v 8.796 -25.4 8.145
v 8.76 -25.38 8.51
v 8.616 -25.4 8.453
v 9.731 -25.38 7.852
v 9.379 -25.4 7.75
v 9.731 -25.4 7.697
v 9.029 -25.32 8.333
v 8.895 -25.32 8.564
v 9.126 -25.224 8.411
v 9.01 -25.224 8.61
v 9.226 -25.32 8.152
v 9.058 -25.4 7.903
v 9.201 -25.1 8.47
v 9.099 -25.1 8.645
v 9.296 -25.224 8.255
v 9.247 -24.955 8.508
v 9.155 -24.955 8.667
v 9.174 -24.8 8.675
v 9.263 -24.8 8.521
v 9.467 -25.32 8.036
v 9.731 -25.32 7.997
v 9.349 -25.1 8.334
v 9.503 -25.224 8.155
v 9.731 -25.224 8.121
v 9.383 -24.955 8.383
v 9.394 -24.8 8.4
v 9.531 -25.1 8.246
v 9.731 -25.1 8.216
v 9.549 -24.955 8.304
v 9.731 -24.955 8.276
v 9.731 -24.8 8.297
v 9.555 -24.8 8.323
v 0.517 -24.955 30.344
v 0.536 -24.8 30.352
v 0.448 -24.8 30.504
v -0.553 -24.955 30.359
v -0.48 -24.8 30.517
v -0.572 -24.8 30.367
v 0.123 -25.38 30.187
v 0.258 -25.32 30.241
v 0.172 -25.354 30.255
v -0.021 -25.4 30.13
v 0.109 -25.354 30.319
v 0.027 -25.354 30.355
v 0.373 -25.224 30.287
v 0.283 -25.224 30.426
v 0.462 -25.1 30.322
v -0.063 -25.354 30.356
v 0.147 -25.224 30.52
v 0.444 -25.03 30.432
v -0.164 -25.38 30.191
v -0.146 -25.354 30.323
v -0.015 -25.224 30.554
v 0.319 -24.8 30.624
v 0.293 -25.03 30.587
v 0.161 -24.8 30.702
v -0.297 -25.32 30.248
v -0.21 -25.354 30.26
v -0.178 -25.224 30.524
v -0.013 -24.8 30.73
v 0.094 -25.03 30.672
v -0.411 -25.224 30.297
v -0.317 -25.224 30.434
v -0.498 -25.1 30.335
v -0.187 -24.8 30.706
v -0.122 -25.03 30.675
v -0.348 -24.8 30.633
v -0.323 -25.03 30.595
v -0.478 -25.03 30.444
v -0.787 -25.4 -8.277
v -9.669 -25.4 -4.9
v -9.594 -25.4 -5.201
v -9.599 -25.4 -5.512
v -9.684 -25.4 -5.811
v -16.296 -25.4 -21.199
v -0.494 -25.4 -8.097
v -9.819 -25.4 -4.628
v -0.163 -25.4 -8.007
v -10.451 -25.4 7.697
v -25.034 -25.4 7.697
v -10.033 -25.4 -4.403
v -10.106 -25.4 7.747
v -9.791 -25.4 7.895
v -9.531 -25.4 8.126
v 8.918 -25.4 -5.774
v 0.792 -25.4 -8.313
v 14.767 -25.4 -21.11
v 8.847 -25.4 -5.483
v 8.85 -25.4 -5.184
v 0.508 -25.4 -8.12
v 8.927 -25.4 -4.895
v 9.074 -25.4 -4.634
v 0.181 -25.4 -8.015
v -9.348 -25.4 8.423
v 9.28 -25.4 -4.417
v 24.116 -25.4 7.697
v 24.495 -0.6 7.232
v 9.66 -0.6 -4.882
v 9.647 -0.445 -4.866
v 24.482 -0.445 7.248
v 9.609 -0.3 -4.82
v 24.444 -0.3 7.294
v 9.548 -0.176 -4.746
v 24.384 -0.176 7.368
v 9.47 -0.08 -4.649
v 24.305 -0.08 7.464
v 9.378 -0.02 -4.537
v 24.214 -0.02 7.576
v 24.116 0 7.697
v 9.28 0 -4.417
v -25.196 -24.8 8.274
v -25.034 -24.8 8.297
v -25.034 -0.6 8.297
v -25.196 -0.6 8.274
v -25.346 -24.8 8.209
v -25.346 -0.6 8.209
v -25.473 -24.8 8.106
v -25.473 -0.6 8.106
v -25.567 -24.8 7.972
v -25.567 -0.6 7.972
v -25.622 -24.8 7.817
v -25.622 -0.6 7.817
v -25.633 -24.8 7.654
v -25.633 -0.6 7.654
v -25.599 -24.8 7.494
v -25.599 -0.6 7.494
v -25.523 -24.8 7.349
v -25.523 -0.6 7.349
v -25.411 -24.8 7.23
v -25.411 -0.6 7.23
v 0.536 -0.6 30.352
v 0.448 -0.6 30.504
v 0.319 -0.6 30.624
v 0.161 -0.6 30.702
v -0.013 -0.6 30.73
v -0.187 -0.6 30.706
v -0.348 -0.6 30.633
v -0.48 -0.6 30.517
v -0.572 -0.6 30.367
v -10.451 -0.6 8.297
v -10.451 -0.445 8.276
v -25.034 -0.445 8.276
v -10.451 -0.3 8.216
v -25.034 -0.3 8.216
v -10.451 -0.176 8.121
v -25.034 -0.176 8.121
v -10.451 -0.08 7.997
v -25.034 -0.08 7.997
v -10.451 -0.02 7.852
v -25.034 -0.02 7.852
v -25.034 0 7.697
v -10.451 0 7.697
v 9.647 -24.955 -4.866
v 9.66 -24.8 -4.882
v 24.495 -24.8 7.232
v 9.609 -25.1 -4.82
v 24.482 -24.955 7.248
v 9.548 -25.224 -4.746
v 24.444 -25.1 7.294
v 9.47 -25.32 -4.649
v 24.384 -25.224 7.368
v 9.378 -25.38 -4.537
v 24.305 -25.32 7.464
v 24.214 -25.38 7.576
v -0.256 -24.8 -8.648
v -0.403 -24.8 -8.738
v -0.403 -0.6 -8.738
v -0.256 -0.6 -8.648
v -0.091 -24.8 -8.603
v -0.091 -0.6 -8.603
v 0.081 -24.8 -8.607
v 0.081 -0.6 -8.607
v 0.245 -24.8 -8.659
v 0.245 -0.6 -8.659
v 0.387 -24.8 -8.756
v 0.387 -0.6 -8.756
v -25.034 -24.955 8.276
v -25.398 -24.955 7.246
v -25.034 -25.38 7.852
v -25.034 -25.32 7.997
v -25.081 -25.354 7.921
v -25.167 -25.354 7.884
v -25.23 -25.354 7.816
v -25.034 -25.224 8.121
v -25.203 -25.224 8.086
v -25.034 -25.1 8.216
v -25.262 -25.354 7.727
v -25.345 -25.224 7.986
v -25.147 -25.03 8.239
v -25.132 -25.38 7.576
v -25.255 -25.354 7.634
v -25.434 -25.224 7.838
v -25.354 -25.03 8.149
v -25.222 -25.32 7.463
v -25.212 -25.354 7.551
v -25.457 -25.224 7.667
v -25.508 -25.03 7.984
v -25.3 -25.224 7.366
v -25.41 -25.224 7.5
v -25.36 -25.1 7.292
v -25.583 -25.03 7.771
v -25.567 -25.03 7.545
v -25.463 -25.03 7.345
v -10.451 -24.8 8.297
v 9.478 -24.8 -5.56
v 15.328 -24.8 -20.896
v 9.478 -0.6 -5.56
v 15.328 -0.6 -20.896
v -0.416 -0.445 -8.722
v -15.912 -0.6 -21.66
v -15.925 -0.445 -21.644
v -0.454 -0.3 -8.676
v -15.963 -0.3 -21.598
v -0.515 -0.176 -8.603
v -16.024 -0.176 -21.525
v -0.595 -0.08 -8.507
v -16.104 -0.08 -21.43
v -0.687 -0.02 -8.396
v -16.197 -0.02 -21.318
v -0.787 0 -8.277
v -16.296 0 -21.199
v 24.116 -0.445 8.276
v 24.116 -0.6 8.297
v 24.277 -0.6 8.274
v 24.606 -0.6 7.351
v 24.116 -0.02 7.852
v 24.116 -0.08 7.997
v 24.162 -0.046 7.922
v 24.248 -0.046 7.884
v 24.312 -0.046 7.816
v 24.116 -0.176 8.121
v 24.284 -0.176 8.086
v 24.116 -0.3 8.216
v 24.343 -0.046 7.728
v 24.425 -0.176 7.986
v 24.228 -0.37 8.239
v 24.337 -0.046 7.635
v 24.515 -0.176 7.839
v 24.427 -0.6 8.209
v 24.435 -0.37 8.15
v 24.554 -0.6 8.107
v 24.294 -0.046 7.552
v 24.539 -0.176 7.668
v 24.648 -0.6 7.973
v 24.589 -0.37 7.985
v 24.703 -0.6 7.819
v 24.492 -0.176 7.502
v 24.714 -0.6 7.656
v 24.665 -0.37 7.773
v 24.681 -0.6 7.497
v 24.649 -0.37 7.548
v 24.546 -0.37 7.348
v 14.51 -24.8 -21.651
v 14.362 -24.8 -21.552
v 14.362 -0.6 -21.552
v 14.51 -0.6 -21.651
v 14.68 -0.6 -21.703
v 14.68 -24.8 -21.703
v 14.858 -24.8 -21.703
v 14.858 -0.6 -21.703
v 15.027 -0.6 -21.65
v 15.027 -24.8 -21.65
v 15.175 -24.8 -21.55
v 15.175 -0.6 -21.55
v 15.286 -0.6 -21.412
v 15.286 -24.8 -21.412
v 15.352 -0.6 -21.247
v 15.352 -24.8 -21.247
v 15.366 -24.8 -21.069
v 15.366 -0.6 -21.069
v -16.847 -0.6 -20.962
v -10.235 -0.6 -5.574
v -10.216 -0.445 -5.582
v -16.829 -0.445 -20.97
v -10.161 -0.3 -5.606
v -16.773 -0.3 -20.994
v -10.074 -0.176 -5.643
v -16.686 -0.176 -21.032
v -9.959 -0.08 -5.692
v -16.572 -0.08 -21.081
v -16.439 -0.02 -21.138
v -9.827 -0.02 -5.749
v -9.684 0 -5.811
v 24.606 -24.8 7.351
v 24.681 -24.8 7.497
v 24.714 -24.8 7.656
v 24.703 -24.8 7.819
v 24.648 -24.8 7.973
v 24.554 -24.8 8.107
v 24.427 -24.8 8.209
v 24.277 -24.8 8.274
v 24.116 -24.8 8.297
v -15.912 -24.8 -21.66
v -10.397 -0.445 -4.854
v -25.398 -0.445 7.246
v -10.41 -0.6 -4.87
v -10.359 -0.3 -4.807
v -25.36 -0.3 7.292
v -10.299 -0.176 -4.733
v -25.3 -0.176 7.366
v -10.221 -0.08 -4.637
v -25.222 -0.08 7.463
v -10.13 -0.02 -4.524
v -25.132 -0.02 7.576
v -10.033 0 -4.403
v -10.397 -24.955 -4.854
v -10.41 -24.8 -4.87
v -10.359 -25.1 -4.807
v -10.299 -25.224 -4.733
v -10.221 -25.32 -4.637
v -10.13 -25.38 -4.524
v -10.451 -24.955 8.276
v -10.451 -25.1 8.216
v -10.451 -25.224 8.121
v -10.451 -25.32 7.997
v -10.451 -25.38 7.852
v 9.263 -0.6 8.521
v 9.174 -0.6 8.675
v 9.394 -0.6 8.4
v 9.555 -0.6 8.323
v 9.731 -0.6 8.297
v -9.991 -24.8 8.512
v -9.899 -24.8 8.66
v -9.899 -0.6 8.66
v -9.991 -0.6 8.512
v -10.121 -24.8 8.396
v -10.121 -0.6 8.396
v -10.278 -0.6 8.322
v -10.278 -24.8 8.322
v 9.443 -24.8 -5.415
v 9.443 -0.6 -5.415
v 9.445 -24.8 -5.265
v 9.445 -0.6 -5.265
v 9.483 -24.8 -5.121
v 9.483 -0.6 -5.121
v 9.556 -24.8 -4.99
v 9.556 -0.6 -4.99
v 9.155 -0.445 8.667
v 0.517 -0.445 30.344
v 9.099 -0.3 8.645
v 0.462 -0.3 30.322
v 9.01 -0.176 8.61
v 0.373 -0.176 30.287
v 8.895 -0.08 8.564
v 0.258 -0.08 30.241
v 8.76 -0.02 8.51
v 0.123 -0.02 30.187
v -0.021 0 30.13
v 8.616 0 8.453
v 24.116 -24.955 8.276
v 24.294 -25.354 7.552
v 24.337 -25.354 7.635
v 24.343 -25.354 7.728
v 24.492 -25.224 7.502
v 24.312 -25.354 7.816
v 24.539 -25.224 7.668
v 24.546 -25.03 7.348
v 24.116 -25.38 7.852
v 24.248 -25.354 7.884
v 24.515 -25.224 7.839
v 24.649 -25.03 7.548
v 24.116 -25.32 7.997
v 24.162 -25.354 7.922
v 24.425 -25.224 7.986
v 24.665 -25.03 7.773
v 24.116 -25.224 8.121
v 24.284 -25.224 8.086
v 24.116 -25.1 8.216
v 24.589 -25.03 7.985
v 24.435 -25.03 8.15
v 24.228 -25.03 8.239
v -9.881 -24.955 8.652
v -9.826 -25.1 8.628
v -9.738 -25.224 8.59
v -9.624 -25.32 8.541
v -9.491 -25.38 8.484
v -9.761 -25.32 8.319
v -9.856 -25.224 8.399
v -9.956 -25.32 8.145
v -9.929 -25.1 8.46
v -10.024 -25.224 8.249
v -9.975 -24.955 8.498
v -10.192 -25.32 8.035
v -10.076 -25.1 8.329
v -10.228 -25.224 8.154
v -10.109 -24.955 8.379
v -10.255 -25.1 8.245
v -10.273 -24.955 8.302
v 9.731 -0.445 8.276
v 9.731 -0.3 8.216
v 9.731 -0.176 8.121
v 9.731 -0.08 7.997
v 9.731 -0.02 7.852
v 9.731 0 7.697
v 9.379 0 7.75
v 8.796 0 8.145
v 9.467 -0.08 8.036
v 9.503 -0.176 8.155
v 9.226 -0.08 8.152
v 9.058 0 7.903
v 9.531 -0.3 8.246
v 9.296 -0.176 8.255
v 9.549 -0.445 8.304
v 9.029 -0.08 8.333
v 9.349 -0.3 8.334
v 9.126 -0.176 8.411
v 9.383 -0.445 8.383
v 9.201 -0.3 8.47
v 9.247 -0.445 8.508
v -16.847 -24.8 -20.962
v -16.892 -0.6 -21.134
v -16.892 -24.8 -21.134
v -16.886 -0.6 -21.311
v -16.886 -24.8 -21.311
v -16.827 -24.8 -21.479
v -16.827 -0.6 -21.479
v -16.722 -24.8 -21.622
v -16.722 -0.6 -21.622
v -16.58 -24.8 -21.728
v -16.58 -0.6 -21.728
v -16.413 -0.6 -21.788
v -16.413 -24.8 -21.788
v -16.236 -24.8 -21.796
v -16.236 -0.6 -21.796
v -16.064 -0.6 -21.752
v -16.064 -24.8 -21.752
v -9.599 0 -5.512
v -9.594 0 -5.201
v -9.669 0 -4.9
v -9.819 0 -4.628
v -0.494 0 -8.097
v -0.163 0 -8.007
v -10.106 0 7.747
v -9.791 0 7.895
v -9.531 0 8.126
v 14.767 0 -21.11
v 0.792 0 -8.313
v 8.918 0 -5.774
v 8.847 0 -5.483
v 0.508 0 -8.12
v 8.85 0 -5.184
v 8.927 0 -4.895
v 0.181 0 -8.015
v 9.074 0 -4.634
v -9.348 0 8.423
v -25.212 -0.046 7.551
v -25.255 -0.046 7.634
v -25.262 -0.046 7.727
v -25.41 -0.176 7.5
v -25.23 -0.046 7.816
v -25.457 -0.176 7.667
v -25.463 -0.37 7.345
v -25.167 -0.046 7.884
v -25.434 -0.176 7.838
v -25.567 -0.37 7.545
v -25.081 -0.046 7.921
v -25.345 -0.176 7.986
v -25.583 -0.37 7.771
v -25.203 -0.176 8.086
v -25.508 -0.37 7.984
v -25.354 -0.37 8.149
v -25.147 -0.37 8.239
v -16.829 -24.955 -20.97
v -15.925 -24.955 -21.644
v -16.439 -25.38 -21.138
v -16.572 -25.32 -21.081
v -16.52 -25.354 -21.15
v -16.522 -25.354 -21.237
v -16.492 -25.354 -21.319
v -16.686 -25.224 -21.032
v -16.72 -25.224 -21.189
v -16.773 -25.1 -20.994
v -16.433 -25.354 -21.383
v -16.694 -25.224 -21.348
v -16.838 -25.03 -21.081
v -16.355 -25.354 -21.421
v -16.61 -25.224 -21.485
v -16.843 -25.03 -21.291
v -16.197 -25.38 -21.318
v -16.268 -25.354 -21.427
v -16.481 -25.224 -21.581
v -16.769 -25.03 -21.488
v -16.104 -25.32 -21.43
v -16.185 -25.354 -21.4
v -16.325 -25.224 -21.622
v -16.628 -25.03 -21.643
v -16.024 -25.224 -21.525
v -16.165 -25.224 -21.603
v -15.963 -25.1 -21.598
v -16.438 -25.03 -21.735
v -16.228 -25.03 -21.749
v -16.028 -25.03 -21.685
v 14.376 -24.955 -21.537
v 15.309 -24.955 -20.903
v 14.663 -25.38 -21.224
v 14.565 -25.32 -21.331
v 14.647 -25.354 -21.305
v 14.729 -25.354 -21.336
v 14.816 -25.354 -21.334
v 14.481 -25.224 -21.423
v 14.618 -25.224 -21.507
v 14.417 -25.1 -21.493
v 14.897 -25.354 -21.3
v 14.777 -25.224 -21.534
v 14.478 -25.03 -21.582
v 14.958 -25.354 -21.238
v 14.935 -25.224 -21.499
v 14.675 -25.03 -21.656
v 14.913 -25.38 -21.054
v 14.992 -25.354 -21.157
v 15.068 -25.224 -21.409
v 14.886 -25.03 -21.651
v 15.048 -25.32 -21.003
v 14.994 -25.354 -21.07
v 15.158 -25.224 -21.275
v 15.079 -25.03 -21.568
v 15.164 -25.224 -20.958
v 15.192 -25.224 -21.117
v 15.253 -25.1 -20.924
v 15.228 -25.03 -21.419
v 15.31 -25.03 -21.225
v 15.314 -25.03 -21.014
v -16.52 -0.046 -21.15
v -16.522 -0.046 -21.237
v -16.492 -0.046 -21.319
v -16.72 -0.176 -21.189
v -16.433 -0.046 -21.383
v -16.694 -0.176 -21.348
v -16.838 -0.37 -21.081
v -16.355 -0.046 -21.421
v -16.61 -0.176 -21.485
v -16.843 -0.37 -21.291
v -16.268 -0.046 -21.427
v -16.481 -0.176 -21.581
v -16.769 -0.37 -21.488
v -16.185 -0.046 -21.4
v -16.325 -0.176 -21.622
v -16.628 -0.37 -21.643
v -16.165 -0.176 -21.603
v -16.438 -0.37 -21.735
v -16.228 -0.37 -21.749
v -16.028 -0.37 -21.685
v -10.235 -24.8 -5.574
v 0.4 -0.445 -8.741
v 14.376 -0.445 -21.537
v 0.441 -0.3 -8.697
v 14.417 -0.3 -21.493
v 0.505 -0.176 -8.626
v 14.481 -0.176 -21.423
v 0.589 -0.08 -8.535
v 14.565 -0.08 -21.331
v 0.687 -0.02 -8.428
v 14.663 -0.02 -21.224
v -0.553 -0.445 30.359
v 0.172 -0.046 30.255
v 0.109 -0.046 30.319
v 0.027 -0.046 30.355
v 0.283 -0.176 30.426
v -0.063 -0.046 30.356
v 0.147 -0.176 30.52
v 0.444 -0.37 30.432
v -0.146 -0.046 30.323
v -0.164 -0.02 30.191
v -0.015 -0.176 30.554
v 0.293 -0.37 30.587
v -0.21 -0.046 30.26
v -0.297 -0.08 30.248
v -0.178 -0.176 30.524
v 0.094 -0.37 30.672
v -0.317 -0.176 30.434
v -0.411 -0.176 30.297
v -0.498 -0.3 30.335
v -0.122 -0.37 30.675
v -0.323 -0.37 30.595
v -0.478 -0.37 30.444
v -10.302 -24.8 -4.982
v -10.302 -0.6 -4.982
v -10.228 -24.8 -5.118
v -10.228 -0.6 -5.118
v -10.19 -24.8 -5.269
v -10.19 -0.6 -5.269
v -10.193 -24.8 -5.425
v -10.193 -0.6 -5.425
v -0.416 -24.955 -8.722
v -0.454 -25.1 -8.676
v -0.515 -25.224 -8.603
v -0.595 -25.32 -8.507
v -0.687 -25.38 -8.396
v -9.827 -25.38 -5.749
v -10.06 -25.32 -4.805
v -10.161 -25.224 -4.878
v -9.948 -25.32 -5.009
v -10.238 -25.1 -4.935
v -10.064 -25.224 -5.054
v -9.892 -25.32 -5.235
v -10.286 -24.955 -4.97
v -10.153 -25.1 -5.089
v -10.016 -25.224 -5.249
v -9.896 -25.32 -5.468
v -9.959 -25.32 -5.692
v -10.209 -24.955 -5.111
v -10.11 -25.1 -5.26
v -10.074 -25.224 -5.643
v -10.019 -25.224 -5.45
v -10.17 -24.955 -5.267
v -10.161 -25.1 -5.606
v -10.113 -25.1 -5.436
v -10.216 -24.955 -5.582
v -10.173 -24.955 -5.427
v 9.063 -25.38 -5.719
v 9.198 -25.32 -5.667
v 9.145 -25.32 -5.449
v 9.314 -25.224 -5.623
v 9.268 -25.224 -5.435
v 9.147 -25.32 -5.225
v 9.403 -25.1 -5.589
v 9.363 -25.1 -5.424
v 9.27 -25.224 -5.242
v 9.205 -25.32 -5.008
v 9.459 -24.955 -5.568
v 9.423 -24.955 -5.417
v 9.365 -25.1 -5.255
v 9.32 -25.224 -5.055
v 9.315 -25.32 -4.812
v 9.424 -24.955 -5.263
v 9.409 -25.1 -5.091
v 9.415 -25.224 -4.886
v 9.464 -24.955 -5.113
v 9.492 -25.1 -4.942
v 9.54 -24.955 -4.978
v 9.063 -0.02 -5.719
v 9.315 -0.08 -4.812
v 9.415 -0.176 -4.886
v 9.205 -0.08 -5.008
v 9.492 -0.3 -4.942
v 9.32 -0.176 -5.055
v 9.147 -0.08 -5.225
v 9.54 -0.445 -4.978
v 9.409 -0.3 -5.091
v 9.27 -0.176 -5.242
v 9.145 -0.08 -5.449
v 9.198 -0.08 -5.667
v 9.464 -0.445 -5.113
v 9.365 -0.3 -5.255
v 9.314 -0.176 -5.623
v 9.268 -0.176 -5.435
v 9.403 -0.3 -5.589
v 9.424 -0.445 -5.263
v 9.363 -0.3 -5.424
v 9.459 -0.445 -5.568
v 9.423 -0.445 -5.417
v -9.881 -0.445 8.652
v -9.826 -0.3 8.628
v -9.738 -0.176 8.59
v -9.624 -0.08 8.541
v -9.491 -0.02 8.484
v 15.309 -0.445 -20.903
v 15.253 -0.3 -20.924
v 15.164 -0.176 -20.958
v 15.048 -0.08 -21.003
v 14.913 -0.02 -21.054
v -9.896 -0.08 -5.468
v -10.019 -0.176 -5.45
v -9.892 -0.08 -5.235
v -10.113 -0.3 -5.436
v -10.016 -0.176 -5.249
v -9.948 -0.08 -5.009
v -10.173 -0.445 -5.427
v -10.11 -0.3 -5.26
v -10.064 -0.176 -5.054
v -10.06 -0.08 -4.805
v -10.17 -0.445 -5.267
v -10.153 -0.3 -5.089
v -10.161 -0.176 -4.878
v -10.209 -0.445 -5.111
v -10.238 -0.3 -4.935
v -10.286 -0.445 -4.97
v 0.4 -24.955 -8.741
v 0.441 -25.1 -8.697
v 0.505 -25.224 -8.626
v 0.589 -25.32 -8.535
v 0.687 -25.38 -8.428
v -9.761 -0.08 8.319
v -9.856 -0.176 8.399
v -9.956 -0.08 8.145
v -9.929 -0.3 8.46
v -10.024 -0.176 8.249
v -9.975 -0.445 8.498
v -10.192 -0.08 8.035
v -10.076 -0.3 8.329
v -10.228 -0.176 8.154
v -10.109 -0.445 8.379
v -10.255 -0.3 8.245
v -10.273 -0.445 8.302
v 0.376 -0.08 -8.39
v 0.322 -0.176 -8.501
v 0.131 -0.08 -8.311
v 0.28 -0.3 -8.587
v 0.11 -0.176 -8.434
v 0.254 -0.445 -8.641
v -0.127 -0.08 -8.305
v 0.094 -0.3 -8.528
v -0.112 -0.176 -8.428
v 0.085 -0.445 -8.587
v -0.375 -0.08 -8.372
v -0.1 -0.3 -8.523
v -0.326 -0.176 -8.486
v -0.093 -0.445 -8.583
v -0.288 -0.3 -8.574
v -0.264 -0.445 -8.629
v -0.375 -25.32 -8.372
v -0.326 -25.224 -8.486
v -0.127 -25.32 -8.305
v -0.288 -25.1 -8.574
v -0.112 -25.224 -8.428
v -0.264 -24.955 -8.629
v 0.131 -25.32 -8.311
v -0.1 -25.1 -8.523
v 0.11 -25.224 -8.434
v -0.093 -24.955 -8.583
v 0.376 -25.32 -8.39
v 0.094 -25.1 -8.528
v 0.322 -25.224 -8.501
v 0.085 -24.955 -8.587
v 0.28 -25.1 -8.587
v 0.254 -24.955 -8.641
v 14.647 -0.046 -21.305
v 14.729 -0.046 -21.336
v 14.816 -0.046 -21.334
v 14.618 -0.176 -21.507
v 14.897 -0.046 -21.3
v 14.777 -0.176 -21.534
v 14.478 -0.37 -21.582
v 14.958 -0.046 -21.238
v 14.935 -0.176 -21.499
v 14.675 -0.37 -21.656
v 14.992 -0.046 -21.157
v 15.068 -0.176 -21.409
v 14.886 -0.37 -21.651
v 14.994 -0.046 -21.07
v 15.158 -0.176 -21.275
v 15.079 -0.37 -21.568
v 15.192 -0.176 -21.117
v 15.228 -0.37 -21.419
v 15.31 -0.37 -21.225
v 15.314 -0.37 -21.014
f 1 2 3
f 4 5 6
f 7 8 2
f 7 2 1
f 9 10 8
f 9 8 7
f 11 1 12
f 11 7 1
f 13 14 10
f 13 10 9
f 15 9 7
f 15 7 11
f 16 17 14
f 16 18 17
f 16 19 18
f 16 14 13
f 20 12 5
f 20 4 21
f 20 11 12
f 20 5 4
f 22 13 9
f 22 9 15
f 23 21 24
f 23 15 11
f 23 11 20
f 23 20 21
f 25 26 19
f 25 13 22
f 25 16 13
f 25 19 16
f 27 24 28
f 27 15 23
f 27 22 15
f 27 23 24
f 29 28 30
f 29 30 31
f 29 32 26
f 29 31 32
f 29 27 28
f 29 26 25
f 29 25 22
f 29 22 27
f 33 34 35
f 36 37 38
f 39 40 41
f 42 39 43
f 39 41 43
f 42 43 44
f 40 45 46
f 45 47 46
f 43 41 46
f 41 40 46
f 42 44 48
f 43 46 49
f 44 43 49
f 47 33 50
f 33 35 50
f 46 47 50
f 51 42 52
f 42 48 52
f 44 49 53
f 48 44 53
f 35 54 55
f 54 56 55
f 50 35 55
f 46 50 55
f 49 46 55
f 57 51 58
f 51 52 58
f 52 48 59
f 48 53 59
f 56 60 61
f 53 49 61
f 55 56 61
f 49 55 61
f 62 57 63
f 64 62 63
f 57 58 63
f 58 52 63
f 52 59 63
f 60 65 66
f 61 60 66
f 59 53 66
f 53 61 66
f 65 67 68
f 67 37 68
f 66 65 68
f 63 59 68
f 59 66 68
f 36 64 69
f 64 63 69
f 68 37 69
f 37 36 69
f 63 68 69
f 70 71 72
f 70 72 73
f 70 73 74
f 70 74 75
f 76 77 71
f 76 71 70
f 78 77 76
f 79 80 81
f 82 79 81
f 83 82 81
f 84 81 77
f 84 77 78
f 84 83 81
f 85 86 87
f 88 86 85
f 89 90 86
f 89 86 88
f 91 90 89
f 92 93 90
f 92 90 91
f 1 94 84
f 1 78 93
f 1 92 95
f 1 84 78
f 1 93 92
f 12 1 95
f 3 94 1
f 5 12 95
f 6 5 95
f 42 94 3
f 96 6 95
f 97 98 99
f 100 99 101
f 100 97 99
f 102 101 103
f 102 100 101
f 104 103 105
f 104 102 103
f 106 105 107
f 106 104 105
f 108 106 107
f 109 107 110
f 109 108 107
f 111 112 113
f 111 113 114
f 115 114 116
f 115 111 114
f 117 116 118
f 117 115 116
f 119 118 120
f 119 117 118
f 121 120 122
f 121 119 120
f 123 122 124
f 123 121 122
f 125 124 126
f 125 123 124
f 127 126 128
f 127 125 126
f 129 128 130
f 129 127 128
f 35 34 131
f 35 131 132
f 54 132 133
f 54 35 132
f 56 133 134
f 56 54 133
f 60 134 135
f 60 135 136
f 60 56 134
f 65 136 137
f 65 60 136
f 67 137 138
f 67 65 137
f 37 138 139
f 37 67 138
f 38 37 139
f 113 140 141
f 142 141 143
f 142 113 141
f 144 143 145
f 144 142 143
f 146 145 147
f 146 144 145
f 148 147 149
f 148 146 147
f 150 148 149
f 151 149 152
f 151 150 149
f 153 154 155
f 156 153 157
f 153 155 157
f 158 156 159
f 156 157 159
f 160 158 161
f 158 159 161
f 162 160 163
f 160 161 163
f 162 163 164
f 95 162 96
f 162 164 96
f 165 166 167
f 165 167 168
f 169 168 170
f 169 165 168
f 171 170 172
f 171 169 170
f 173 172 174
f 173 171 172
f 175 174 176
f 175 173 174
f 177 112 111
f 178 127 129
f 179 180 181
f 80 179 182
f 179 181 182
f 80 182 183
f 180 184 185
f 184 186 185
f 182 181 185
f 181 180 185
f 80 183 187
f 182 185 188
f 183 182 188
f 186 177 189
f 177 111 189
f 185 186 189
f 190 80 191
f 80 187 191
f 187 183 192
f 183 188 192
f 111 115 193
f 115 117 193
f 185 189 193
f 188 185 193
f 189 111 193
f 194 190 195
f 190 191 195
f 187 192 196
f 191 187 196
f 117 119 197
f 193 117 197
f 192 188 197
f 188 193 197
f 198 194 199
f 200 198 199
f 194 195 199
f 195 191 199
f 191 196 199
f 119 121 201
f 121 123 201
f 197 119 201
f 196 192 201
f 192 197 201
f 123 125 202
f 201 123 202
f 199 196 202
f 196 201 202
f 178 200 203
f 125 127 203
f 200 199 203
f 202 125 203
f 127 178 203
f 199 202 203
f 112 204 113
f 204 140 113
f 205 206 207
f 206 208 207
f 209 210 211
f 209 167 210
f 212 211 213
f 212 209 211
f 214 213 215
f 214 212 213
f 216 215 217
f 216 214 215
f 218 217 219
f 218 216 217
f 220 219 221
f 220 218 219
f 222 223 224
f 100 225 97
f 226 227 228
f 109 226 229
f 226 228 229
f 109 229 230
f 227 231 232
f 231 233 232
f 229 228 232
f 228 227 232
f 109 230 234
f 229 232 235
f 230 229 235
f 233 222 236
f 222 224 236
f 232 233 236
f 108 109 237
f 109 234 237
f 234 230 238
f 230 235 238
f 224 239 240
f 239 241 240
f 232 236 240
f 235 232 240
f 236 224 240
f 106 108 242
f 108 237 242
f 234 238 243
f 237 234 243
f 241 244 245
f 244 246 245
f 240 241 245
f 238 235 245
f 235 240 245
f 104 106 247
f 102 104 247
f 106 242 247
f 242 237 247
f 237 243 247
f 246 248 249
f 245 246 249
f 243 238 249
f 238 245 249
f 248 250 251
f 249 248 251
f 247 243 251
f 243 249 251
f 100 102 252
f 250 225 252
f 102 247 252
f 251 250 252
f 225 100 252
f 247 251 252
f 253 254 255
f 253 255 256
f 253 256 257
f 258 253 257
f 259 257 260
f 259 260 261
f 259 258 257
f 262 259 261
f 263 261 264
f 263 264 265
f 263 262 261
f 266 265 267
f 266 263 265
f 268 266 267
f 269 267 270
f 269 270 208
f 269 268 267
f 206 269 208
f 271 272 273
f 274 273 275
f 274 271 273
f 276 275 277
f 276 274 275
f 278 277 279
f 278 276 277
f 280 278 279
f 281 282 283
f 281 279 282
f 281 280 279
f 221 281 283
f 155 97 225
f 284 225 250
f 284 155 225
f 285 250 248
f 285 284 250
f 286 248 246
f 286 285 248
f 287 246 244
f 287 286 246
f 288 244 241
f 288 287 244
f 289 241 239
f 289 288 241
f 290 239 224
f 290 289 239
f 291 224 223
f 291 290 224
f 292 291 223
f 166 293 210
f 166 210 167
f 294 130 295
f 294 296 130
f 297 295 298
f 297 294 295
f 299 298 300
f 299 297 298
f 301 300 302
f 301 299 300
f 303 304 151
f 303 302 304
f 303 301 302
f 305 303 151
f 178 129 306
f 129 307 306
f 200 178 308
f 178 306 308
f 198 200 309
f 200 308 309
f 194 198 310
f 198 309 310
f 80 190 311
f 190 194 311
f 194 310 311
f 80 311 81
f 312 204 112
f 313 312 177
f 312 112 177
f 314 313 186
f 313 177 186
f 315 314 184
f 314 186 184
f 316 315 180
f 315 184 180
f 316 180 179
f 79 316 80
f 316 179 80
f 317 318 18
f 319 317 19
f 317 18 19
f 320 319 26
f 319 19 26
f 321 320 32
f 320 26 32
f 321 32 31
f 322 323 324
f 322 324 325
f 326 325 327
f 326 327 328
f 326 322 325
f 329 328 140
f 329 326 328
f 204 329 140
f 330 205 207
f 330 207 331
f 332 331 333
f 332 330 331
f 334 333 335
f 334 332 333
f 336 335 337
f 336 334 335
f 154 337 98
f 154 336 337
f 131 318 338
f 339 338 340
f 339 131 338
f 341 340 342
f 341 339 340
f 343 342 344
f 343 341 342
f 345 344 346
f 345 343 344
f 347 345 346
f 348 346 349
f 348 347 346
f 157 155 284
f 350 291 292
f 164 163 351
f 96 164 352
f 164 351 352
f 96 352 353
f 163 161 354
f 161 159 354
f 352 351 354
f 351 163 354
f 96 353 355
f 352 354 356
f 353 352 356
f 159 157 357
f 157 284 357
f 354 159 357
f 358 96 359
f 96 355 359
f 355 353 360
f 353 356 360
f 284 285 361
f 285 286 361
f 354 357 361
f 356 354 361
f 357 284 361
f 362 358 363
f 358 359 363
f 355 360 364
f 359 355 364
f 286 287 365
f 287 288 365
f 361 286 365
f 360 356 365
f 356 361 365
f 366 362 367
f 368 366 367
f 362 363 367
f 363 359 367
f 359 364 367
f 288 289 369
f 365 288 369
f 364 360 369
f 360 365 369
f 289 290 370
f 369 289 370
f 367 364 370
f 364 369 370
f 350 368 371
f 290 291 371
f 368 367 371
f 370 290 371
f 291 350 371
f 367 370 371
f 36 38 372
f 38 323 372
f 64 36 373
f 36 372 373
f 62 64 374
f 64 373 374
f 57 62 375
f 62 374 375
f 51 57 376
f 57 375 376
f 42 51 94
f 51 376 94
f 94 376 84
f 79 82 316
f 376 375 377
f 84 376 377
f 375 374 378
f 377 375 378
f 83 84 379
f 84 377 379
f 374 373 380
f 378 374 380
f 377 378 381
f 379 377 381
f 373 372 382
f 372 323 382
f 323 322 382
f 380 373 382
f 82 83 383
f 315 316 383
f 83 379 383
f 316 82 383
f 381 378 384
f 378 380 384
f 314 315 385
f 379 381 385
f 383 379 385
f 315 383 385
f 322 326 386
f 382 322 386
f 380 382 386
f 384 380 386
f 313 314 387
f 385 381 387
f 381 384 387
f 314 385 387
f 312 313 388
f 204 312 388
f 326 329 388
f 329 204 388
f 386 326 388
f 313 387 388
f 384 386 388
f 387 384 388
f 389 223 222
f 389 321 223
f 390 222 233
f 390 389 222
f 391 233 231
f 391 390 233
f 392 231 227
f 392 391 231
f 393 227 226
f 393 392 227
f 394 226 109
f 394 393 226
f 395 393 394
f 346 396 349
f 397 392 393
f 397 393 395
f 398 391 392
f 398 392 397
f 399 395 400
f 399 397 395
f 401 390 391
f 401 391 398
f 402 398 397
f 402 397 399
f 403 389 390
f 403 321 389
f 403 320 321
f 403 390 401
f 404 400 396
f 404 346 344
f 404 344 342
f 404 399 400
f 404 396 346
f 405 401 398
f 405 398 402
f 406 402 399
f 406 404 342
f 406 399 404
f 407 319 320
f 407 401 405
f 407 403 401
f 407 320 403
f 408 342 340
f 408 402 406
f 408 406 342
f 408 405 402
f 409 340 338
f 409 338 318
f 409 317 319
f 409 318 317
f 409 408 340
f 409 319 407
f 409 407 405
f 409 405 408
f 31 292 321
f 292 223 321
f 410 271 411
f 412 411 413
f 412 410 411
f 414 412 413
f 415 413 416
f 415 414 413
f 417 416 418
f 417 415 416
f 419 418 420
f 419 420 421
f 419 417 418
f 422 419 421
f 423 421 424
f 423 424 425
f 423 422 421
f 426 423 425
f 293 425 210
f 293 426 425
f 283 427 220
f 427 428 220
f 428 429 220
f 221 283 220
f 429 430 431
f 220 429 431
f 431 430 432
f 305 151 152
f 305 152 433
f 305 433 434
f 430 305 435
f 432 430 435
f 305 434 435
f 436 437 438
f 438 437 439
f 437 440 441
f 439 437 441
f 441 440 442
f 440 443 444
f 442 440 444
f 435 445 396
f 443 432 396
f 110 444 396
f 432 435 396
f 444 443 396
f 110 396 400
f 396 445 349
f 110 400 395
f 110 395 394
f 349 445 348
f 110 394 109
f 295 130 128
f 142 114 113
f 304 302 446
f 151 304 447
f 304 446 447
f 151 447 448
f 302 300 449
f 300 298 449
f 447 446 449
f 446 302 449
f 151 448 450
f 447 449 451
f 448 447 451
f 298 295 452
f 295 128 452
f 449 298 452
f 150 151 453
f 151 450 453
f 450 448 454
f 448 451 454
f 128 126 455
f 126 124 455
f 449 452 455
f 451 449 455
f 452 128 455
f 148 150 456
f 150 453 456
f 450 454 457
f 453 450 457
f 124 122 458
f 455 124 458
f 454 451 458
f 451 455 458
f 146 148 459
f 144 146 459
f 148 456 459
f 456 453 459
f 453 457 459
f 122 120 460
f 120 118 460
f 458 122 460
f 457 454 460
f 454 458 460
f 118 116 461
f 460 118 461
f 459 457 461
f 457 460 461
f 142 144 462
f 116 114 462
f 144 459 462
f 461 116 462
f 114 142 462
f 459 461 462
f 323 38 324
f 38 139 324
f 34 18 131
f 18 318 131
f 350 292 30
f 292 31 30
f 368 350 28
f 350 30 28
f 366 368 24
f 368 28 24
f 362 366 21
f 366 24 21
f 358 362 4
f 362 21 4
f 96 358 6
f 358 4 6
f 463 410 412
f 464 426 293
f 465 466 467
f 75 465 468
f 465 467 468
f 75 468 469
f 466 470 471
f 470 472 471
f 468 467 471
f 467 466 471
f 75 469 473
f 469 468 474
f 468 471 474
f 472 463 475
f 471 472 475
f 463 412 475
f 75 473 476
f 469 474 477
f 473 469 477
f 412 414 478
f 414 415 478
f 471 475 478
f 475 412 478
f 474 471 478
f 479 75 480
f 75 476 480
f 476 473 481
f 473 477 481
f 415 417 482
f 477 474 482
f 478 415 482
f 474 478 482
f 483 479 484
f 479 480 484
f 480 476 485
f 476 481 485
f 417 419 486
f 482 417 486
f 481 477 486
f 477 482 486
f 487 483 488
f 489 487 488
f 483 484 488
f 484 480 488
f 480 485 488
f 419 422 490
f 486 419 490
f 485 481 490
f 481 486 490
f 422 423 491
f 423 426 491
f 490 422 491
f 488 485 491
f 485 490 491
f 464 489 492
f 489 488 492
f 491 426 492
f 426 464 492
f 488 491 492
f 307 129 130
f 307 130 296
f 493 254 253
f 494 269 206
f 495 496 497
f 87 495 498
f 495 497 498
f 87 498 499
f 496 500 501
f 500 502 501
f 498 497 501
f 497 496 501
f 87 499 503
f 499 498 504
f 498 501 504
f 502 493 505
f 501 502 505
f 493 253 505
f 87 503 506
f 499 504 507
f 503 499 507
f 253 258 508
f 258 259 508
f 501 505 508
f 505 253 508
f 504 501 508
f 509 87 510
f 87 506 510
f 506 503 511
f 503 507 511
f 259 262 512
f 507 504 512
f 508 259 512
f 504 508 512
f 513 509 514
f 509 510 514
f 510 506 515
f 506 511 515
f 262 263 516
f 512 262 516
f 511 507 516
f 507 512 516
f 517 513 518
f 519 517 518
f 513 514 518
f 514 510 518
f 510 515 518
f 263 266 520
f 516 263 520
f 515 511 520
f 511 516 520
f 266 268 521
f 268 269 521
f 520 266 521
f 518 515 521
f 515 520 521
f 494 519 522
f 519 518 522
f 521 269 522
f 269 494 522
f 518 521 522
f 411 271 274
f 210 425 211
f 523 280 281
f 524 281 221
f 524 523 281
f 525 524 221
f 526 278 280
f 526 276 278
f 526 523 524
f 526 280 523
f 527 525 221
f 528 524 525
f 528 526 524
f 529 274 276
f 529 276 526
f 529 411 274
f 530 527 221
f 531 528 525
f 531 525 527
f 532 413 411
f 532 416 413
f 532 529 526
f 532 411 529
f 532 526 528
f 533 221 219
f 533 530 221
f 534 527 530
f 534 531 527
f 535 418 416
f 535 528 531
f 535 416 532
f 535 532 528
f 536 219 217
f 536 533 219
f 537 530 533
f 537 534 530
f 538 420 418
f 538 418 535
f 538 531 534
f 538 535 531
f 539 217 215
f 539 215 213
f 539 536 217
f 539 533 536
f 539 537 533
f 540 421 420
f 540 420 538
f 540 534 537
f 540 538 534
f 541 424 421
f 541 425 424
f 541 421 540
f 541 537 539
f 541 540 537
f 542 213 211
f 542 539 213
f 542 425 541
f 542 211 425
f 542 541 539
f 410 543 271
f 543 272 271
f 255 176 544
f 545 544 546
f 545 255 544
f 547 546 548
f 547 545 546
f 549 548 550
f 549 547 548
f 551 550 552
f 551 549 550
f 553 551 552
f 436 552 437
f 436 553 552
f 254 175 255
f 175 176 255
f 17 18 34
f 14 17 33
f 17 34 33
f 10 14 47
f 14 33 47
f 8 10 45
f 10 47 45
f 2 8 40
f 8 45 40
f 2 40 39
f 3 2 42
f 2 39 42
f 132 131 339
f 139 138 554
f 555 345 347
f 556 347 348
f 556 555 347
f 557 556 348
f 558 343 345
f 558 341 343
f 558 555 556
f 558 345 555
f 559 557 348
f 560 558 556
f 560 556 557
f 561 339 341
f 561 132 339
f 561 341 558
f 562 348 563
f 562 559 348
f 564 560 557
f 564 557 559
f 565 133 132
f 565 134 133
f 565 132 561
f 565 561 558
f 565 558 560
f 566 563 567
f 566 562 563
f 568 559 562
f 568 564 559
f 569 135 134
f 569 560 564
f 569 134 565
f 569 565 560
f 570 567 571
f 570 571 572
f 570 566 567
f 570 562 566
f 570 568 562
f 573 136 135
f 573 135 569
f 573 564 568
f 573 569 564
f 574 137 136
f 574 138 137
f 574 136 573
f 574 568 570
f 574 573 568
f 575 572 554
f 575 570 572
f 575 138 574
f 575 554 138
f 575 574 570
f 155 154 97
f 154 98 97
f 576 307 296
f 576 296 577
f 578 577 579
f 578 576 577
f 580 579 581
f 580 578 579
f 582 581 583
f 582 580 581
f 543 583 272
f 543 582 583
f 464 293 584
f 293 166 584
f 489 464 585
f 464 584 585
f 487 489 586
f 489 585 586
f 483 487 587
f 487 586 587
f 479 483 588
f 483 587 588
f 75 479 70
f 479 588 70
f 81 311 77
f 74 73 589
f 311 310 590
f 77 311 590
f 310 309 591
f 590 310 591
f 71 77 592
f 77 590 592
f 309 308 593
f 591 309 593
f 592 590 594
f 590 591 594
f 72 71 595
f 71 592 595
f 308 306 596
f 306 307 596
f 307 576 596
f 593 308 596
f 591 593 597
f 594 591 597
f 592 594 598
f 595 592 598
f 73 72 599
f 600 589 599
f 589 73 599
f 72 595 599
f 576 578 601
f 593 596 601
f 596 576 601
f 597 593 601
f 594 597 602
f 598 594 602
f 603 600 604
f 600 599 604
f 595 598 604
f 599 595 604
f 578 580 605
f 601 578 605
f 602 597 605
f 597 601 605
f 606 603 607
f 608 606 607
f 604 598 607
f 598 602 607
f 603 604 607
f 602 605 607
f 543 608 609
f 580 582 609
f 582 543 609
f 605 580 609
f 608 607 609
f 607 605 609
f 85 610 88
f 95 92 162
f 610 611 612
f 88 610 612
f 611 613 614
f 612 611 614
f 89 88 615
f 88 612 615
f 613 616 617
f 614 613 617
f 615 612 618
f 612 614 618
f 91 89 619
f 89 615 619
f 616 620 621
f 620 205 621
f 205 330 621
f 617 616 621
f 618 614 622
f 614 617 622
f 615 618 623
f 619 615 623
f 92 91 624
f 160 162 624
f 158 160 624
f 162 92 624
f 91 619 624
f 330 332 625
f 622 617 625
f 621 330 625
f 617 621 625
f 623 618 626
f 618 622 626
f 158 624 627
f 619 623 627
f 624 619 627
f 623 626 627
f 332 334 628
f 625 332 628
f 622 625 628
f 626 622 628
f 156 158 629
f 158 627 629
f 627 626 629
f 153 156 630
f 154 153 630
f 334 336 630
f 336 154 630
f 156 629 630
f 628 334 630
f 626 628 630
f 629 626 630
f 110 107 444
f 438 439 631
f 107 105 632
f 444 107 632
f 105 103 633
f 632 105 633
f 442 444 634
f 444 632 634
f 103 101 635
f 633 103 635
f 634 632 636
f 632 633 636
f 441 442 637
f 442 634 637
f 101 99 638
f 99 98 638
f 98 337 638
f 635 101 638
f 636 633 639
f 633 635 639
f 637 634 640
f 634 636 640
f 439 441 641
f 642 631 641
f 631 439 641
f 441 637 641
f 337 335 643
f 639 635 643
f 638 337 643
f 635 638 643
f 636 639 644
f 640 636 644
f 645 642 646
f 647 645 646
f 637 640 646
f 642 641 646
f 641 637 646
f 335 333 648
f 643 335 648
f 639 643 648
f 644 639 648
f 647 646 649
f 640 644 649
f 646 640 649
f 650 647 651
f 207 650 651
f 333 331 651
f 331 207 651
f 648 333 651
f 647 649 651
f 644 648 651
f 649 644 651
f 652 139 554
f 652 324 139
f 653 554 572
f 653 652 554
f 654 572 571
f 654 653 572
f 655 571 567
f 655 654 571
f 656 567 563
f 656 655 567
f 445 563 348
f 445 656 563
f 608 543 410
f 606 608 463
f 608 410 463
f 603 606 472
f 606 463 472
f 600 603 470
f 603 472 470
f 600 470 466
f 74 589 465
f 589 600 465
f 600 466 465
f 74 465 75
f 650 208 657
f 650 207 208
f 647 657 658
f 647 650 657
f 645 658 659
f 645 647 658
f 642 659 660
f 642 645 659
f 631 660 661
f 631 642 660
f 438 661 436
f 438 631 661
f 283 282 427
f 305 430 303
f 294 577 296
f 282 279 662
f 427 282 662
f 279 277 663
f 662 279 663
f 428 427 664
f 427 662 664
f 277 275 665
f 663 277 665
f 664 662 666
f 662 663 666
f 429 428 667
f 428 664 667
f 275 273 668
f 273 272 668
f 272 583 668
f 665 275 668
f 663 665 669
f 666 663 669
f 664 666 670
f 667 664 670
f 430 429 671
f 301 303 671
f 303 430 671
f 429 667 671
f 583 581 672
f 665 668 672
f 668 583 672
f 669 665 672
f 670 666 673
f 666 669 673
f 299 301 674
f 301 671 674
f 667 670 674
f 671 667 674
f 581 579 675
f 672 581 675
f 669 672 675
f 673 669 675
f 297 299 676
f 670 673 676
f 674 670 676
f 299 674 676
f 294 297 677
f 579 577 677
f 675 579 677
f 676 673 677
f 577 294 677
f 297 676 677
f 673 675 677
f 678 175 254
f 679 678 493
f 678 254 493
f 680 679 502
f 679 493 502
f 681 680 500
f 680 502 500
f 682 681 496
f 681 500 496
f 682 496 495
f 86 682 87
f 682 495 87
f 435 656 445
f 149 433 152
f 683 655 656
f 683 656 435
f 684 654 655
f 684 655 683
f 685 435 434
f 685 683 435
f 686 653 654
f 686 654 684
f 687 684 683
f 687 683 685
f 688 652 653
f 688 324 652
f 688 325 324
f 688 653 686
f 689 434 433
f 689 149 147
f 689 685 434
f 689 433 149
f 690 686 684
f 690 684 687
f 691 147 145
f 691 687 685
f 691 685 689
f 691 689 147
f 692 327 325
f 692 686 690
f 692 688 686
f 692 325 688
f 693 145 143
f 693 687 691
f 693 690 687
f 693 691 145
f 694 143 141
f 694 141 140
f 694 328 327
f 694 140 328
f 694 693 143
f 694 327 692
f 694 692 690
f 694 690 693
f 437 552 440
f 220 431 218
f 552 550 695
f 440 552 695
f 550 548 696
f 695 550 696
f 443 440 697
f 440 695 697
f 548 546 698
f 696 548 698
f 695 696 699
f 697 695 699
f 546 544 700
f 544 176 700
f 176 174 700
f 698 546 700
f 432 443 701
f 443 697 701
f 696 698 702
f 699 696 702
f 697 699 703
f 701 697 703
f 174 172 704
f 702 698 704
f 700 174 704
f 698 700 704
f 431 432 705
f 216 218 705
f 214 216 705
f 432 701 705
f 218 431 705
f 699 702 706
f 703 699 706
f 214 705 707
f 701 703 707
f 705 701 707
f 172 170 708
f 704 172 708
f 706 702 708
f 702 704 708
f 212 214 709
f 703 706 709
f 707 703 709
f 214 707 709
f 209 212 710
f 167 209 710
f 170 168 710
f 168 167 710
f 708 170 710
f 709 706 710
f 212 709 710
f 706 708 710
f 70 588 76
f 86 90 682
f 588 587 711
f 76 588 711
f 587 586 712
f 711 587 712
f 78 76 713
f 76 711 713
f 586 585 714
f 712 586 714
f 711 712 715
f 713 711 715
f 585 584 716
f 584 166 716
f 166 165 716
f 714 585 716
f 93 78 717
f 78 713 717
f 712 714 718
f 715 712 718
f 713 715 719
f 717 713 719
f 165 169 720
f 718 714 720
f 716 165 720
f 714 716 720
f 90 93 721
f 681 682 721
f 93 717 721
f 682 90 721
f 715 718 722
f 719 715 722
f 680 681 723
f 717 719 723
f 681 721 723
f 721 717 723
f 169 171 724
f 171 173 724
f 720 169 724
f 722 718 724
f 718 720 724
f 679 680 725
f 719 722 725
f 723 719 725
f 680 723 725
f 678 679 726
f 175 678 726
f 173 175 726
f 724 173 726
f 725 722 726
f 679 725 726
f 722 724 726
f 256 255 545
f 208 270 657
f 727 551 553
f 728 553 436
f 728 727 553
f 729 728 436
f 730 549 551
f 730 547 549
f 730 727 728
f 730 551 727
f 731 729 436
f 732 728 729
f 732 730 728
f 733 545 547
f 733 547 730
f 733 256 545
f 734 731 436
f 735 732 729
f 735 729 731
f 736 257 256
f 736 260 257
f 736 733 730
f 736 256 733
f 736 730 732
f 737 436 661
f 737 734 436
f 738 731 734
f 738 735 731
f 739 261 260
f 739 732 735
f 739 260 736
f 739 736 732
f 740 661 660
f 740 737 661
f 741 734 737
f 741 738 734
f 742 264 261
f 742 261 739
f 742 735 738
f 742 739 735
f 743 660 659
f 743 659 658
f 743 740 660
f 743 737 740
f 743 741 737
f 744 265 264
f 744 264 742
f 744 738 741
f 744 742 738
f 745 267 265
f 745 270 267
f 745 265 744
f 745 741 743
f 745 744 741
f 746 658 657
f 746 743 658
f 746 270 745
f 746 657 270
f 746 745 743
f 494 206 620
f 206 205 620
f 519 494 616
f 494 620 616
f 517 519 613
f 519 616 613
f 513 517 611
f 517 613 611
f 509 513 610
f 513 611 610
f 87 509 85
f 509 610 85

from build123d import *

# Parameters (mm, degrees)
F1_DEPTH = 25.4
F2_R     = 0.6


with BuildPart() as f1:
    # F0 (on Front) → F1 (new body)
    with BuildSketch(Plane.XZ):
        Polygon((9.3241402825, 8.2967067137), (0, 31.6984727979), (-10.0554463643, 8.2967067137), (-26.7336517572, 8.2967067137), (-10.0554463643, -5.155775696), (-17.8360161943, -23.2632836642), (0, -8.402004838), (16.2311457098, -23.2632836642), (9.3241402825, -5.155775696), (25.7989484817, 8.2967067137), align=None)
    extrude(amount=F1_DEPTH)

    # F2
    f2_edges = [f1.edges().sort_by_distance(p)[0] for p in [
        (4.66207, -25.4, 19.99759),
        (-5.027723, -25.4, 19.99759),
        (-18.394549, -25.4, 8.296707),
        (-18.394549, -25.4, 1.570466),
        (-13.945731, -25.4, -14.20953),
        (-8.918008, -25.4, -15.832644),
        (8.115573, -25.4, -15.832644),
        (12.777643, -25.4, -14.20953),
        (17.561544, -25.4, 1.570466),
        (17.561544, -25.4, 8.296707),
        (25.798948, -12.7, 8.296707),
        (9.32414, -12.7, 8.296707),
        (17.561544, 0, 8.296707),
        (0, -12.7, 31.698473),
        (4.66207, 0, 19.99759),
        (-10.055446, -12.7, 8.296707),
        (-5.027723, 0, 19.99759),
        (-10.055446, -12.7, -5.155776),
        (-17.836016, -12.7, -23.263284),
        (-13.945731, 0, -14.20953),
        (-26.733652, -12.7, 8.296707),
        (-18.394549, 0, 1.570466),
        (0, -12.7, -8.402005),
        (16.231146, -12.7, -23.263284),
        (8.115573, 0, -15.832644),
        (-8.918008, 0, -15.832644),
        (9.32414, -12.7, -5.155776),
        (17.561544, 0, 1.570466),
        (12.777643, 0, -14.20953),
        (-18.394549, 0, 8.296707),
    ]]
    fillet(f2_edges, radius=F2_R)


solid = f1.part
